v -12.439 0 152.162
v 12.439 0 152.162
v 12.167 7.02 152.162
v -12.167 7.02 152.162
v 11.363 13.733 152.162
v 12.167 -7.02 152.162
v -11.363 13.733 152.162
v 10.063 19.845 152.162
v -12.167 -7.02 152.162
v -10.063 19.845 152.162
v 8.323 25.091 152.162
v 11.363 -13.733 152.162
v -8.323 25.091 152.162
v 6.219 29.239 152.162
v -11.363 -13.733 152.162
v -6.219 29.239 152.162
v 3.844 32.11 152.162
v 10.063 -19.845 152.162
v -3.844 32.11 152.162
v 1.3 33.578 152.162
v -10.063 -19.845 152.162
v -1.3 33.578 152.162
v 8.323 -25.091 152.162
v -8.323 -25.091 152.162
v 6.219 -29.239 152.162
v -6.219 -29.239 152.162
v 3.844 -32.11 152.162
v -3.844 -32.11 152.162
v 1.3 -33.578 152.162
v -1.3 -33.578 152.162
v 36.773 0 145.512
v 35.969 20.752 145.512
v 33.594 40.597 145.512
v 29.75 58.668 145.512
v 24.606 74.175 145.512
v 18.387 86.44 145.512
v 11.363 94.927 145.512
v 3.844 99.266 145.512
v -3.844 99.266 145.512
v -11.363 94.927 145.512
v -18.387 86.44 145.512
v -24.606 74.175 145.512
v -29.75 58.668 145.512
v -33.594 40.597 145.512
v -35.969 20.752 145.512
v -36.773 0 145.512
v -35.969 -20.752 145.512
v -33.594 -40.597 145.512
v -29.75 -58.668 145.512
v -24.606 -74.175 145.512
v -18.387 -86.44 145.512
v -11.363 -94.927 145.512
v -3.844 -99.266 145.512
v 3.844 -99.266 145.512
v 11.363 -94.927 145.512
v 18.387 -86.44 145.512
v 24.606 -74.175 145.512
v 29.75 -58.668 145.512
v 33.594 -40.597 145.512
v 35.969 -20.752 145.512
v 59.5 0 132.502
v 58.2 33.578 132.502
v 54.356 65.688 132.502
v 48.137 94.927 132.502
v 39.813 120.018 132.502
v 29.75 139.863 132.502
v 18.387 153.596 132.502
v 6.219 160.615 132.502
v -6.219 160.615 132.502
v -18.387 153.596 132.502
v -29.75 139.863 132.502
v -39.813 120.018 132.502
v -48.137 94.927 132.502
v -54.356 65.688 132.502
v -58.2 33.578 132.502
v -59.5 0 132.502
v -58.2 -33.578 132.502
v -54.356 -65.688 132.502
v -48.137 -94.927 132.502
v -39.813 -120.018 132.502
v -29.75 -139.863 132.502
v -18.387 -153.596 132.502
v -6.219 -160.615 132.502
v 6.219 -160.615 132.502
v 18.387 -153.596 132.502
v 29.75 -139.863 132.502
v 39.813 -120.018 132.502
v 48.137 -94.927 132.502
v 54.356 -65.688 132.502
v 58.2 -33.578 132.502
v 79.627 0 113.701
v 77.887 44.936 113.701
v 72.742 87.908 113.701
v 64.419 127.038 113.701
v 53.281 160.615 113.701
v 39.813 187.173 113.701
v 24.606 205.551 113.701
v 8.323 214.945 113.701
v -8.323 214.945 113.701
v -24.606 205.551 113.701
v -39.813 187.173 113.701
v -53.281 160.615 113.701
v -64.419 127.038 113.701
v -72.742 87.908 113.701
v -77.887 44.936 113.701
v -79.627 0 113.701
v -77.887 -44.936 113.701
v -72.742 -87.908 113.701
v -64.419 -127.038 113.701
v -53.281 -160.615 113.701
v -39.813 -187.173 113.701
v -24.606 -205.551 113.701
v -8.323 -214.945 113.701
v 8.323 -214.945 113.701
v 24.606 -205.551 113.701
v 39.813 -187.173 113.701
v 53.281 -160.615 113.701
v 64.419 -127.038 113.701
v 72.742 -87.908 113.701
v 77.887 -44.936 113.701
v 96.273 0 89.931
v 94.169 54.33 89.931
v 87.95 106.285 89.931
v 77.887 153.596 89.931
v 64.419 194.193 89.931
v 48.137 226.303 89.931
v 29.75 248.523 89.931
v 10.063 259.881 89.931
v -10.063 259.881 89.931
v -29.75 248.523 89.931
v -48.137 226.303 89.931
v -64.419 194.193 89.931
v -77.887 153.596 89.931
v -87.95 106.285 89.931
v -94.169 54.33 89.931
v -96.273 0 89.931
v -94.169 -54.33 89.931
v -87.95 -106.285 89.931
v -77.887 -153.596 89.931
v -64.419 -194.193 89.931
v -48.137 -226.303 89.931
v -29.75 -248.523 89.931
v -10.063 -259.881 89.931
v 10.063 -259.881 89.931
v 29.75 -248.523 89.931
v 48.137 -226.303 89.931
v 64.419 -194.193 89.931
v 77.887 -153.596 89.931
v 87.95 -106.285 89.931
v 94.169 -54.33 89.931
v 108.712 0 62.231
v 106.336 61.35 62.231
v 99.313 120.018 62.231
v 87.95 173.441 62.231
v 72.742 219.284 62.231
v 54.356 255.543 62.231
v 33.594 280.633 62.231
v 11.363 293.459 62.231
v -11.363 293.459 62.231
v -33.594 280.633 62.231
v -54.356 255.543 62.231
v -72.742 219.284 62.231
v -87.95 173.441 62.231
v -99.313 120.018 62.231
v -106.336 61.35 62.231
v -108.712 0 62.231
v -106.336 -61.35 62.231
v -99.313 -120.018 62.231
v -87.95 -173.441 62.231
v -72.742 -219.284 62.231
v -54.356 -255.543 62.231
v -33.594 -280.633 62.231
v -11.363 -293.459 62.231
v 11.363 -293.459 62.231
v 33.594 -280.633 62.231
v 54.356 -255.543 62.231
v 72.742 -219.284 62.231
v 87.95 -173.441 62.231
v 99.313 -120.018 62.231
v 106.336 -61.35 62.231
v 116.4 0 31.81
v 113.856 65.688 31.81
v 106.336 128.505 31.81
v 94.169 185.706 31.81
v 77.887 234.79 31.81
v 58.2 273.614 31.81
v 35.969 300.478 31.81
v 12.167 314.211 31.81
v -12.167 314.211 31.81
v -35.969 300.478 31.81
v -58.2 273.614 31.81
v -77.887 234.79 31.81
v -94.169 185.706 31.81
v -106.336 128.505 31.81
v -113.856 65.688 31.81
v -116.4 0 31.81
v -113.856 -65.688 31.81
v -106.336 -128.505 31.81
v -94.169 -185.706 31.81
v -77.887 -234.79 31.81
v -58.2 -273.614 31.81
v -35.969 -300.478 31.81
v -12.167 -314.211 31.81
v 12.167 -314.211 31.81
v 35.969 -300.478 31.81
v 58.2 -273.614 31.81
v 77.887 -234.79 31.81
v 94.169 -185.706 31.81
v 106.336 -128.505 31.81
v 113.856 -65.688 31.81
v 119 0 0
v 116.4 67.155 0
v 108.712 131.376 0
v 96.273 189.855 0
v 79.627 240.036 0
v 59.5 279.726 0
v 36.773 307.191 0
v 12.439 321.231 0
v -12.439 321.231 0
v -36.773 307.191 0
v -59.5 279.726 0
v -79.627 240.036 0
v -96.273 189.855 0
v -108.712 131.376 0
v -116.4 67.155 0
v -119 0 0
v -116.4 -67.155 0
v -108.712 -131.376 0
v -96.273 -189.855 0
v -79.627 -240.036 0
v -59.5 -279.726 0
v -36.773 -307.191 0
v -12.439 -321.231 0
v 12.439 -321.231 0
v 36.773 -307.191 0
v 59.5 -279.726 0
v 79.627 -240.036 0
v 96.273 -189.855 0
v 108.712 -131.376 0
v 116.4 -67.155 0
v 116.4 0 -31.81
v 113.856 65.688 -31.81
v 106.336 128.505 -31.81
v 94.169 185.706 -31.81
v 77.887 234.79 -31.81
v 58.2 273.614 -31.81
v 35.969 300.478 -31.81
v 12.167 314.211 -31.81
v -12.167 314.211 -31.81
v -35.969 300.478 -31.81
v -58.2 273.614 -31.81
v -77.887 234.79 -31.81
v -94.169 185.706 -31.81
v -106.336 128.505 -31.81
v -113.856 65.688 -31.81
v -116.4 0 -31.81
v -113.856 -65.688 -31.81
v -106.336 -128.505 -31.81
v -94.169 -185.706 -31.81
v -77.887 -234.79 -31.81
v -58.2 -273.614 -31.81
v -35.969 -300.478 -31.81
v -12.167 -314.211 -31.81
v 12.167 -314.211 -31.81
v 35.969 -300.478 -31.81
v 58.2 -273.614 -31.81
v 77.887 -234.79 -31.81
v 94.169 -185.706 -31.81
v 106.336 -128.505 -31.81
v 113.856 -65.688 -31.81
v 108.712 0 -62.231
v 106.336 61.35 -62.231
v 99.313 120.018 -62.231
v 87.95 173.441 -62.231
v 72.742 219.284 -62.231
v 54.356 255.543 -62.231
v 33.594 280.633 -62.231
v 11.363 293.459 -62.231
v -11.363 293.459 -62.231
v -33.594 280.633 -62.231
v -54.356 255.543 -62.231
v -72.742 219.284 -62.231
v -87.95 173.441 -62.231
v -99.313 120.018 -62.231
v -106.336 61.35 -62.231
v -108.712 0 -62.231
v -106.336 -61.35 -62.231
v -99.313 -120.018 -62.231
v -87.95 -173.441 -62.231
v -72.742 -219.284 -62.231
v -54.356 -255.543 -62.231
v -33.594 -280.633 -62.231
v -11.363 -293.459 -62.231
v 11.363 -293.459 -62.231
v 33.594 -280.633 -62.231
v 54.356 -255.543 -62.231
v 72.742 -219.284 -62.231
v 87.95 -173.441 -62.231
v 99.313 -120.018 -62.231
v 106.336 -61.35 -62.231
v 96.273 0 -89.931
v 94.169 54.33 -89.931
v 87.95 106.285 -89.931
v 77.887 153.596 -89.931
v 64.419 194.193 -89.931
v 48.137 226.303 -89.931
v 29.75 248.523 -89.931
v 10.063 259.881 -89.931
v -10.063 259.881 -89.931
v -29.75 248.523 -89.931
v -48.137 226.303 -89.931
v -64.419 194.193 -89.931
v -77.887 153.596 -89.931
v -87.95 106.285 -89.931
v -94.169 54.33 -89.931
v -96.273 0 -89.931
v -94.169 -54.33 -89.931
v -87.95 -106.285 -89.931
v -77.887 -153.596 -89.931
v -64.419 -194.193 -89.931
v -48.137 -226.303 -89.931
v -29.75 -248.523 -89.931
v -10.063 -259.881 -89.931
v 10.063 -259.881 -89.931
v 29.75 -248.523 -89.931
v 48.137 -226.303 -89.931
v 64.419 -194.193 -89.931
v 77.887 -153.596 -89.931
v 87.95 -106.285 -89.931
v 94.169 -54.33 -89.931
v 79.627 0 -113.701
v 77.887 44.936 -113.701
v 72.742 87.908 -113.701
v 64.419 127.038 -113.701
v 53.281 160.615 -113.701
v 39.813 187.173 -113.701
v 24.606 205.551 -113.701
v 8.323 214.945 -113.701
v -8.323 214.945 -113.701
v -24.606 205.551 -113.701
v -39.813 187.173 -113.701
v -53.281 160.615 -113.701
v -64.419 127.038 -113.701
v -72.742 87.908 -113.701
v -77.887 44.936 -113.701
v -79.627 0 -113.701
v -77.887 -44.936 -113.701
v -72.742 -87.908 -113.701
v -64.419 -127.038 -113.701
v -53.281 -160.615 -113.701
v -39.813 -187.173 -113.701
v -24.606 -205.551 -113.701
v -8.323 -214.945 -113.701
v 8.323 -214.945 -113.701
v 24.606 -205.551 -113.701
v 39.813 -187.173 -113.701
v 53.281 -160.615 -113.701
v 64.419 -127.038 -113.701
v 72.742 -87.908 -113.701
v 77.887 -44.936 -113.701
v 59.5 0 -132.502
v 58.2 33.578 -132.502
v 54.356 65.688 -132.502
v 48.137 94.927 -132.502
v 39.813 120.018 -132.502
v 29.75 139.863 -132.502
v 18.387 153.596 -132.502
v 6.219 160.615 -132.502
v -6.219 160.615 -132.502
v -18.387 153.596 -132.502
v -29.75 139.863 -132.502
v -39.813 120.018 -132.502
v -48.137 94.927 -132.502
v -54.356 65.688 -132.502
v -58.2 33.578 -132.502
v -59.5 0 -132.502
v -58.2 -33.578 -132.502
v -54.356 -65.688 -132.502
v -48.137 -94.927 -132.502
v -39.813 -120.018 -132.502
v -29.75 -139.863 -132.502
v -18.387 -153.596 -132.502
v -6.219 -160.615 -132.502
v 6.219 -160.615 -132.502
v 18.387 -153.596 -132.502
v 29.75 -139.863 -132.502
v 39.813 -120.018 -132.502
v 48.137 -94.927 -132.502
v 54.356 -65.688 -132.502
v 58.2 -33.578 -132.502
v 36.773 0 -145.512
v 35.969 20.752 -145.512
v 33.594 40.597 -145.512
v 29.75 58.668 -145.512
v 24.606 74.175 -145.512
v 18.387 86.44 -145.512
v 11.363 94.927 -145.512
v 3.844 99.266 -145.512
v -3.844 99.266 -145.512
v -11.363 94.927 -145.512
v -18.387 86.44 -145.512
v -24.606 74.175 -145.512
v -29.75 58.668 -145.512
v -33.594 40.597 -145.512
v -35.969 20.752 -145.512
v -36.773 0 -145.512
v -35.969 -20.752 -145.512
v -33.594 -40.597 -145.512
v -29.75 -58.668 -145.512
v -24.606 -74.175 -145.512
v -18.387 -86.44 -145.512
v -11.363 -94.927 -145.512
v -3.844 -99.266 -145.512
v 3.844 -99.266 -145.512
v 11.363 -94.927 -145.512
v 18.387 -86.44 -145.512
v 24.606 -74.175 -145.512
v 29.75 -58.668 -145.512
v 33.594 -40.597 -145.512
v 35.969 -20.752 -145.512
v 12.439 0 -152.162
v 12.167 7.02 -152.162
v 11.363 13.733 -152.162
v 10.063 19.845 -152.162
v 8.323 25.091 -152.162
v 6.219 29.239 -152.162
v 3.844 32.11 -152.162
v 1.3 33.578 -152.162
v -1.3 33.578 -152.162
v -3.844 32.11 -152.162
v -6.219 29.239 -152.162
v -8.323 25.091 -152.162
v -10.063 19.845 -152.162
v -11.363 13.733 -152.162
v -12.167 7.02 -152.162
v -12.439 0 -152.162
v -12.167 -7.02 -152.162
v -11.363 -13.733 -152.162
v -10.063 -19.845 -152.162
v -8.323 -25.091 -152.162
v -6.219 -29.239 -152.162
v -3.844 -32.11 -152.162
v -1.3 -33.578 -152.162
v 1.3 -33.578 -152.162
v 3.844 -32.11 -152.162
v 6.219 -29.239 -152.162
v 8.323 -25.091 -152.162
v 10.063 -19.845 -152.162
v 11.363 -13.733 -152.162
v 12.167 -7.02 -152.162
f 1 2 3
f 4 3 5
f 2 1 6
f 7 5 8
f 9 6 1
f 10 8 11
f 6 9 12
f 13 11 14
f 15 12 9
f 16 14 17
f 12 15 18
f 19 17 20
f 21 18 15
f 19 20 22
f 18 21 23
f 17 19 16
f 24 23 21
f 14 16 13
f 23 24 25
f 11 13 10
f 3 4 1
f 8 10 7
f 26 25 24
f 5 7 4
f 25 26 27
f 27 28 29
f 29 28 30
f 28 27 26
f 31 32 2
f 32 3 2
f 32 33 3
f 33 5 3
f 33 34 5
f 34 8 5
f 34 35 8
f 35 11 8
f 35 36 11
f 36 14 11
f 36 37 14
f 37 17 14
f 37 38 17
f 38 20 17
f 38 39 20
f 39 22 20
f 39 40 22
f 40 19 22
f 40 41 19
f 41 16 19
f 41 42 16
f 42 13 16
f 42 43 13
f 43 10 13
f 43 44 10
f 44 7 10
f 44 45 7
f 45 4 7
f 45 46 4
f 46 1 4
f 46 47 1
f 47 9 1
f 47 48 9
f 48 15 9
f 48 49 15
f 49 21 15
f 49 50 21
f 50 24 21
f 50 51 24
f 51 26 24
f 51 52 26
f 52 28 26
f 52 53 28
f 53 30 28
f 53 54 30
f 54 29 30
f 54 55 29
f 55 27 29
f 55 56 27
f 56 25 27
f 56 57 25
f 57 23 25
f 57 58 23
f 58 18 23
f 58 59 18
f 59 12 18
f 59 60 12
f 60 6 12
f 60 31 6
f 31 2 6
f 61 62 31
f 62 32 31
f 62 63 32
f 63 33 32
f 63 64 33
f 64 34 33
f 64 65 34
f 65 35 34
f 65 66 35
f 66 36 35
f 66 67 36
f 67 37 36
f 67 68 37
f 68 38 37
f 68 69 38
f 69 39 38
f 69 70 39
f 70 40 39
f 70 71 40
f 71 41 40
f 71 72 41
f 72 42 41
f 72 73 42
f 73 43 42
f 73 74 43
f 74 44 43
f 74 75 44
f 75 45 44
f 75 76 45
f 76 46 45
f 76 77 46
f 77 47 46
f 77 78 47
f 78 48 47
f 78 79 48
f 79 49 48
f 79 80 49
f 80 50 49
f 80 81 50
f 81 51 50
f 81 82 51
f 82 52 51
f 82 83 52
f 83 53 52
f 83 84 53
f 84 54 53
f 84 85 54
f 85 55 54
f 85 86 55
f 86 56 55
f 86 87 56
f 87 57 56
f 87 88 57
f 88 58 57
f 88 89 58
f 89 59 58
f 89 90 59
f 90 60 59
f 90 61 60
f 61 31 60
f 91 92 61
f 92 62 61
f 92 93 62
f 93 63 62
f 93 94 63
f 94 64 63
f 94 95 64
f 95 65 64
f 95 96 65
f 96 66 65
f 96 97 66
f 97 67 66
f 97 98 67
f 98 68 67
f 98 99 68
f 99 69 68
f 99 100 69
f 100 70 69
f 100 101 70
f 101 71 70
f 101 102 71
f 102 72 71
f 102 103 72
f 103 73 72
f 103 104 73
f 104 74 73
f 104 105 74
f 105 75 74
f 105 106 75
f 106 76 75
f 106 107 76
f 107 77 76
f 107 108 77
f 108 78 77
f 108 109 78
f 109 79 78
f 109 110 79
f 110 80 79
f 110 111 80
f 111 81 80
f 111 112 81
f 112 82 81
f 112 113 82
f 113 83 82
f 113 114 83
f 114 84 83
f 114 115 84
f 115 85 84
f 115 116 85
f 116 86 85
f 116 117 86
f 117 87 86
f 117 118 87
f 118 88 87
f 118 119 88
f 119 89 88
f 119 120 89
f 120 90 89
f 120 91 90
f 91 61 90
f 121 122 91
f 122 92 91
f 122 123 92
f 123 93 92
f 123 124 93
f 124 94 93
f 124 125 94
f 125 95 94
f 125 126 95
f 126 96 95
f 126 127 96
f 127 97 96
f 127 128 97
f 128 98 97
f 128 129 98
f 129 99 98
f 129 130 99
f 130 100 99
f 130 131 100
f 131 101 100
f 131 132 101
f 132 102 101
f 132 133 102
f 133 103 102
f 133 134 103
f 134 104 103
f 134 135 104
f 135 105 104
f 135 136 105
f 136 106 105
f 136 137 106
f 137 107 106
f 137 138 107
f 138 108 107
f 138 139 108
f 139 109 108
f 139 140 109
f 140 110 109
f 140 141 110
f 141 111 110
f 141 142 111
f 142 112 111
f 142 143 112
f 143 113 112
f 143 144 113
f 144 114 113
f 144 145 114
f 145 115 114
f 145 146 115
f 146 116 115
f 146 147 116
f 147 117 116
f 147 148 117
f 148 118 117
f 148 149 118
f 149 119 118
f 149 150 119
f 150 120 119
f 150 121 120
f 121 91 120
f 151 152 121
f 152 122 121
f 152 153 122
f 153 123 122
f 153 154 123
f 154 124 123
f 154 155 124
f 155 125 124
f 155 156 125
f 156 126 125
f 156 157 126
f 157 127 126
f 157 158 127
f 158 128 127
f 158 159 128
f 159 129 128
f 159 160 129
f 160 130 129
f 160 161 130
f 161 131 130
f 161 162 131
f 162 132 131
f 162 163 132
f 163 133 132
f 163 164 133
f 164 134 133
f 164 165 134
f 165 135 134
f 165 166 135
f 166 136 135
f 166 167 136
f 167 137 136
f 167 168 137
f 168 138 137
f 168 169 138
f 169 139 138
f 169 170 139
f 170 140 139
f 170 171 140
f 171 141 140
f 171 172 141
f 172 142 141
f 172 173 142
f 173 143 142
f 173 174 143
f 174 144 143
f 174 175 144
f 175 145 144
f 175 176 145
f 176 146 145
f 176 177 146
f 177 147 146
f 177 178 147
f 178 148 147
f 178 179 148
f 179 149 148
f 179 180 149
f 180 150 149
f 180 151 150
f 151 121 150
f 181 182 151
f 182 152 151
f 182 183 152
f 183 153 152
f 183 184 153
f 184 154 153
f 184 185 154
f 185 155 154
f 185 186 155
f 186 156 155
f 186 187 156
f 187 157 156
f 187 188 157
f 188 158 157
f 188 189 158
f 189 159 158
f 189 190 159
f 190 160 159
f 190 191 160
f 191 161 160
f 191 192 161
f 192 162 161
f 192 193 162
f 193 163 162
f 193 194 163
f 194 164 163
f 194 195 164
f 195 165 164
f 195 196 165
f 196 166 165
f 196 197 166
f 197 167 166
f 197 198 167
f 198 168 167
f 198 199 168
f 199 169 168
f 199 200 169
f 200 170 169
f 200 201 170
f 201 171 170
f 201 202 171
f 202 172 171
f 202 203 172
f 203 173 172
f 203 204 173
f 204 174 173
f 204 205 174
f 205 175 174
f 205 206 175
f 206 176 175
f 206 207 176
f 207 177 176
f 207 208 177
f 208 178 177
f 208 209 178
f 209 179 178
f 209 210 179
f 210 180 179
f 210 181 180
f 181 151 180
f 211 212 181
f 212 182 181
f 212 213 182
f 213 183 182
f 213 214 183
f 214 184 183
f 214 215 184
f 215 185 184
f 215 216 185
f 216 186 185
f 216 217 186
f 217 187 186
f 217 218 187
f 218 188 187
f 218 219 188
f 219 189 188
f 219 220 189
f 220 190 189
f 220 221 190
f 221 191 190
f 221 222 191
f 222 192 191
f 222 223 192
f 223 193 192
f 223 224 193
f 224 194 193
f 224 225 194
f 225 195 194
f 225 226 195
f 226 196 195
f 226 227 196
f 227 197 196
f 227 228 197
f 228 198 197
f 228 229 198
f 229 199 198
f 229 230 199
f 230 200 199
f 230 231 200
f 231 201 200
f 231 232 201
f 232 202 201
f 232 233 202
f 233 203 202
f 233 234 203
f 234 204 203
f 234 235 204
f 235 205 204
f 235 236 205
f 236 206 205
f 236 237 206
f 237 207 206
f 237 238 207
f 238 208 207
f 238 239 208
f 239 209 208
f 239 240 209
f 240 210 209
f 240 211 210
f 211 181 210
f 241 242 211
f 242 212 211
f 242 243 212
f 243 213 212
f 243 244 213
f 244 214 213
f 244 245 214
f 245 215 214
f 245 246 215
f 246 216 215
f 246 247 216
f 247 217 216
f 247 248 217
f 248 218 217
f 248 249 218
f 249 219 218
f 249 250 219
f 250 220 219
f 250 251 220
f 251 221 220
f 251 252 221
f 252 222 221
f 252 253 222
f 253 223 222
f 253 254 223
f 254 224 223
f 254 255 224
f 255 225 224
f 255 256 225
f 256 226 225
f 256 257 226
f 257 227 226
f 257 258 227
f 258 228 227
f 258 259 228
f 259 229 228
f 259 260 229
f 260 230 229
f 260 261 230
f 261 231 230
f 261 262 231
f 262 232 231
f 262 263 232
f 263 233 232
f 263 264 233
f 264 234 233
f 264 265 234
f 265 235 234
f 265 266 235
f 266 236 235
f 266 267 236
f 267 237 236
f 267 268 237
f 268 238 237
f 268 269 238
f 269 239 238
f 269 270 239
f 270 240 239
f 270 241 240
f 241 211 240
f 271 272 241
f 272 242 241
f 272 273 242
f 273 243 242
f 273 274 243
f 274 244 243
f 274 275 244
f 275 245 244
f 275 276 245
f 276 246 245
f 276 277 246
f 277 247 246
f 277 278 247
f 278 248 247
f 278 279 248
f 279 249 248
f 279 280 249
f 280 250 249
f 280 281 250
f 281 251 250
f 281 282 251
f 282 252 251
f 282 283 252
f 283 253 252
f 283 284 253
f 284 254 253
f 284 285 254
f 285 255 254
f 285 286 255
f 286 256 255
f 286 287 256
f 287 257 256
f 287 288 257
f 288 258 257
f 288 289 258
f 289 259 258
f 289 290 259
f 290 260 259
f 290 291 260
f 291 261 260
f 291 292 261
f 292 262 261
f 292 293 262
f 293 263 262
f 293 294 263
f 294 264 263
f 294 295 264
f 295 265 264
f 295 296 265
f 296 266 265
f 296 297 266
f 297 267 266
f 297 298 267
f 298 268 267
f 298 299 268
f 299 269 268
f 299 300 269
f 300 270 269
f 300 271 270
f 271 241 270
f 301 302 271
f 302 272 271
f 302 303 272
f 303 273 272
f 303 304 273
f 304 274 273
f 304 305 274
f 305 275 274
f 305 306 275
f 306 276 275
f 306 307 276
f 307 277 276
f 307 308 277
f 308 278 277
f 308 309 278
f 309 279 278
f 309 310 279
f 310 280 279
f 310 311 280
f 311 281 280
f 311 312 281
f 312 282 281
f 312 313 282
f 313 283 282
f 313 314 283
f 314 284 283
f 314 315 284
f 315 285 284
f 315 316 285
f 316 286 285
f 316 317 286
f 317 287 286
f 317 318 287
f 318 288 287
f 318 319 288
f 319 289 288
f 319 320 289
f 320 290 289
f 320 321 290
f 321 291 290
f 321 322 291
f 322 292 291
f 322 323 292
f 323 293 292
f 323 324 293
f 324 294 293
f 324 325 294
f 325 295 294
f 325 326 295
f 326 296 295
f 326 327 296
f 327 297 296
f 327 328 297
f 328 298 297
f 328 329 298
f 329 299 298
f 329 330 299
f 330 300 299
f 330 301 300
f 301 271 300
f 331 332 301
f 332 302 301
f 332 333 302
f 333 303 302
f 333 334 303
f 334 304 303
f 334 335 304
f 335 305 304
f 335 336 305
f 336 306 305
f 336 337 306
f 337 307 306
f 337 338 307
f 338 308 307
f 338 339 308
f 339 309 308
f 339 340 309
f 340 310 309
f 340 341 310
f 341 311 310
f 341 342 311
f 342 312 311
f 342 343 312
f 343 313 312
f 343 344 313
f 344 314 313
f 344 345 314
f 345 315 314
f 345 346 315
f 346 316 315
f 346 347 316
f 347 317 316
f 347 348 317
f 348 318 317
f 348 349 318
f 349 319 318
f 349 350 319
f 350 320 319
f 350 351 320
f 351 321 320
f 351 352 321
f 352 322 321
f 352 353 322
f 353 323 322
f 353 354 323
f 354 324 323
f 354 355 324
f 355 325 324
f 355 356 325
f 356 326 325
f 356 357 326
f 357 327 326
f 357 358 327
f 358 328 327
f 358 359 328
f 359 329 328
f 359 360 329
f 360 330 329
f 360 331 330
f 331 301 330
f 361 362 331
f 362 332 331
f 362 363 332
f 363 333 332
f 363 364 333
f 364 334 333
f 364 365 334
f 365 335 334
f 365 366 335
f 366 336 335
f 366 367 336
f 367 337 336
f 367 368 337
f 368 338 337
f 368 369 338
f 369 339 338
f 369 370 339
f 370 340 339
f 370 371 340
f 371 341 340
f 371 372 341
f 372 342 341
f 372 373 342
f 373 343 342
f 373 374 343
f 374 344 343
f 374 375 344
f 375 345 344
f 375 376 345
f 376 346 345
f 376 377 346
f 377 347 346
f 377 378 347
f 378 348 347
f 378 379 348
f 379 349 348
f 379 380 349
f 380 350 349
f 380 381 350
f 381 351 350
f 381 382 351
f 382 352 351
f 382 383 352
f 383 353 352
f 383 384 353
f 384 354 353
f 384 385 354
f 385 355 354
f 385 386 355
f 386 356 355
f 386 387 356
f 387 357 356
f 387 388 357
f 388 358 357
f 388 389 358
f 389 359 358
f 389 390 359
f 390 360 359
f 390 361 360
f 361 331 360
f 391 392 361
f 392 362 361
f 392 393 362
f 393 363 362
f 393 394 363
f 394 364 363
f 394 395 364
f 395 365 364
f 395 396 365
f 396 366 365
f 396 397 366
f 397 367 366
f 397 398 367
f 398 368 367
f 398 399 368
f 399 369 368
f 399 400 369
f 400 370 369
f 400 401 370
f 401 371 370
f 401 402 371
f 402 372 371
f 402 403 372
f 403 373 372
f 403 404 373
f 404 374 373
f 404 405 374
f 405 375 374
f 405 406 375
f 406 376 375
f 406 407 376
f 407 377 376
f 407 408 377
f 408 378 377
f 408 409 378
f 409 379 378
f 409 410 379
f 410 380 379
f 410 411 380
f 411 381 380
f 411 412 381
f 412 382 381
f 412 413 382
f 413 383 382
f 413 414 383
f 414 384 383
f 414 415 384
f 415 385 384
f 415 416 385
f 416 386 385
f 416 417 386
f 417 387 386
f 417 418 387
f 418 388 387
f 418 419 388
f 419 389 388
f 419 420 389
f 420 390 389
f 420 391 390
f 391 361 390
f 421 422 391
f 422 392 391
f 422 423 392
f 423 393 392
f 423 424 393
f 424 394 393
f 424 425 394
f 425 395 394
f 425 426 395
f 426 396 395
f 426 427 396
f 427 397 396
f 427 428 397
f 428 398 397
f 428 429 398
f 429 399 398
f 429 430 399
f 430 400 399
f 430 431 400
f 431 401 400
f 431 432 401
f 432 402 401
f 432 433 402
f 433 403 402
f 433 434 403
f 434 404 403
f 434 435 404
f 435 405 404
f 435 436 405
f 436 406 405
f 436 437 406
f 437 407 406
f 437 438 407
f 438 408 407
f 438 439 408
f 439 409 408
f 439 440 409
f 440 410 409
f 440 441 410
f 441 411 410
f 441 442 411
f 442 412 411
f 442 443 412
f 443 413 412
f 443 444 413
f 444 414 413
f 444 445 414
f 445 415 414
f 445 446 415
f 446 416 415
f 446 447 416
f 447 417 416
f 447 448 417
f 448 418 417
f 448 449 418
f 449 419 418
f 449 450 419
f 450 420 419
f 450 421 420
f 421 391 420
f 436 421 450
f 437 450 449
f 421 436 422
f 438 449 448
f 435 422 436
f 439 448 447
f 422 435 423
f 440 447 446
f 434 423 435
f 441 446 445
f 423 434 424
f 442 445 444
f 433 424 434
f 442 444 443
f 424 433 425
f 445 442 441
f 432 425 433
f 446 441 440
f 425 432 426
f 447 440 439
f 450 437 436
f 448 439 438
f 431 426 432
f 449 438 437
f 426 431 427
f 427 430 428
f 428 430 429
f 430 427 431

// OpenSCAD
// Generated by SolidPython 1.0.1 on 2020-07-29 00:46:48


scale(v = [7, 19, 9]) {
	sphere(r = 17);
}
/***********************************************
*********      SolidPython code:      **********
************************************************
 
# import packages: SolidPython
from solid import *
from solid.utils import *
from itertools import chain, combinations, permutations


class Resize:

    def __init__(self, scad_file):
        self.scad_file = scad_file
        #self.scad_file = import_scad(scad_file)
        # cone/cylinder param:
        self.r1 = 0
        self.r2 = 0
        self.h = 0
        # rectangular prism param:
        self.w = 0
        self.l = 0
        # ellipse param:
        self.r = 0

    # import OpenScad code (file name corresponds to shape)


    # classify shape + parameters
    def assign(self, param1, param2, param3):
        if self.scad_file == 'cone.scad':
            self.r1 = param1
            self.r2 = param2
            self.h = param3
        elif self.scad_file == 'cylinder.scad':
            self.r1 = param1
            self.r2 = param2
            self.h = param3
        elif self.scad_file == 'rectangularPrism.scad':
            self.h = param1
            self.l = param2
            self.w = param3
        else:
            self.r = param1
            self.h = param2

    # resize parameters
    def iterate(self):
        x = range(3, 20, 2)
        i = 1
        if self.scad_file == 'cone.scad':
            tempList = list(permutations(x, 2))
            for temp in tempList:
                param1 = temp[0]
                param2 = temp[1]
                filepath = 'produced_scad_files/' + 'cone' + str(param1) + '_' + str(param2) + '_' + '.scad'
                scad_render_to_file(cylinder(h=param1, r1=param2, r2=0), filepath)

        elif self.scad_file == 'cylinder.scad':
            tempList = list(permutations(x, 3))
            for temp in tempList:
                param1 = temp[0]
                param2 = temp[1]
                filepath = 'produced_scad_files/' + 'cylinder' + str(param1) + '_' + str(param2) + '_' + '.scad'
                scad_render_to_file(cylinder(h=param1, r1=param2, r2=param2), filepath)

        elif self.scad_file == 'rectangularPrism.scad':
            tempList = list(permutations(x, 3))
            for temp in tempList:
                param1 = temp[0]
                param2 = temp[1]
                param3 = temp[2]
                filepath = 'produced_scad_files/' + 'rectangularPrism' + str(param1) + '_' + str(param2) + '_' + str(
                    param3) + '.scad'
                scad_render_to_file(cube(size=(param1, param2, param3)), filepath)

        elif self.scad_file == 'ellipse.scad':
            tempList = list(permutations(x, 4))
            for temp in tempList:
                param1 = temp[0]
                param2 = temp[1]
                param3 = temp[2]
                param4 = temp[3]
                filepath = 'produced_scad_files/' + 'ellipse' + str(param1) + '_' + str(param2) + '_' + str(param3) + '_' + str(param4) + '.scad'
                scad_render_to_file(scale([param1, param2, param3])(sphere(r=param4)), filepath)

    def render_to_scadfile(self):
        scad_render_to_file(scad, 'example.scad') 
 
************************************************/
